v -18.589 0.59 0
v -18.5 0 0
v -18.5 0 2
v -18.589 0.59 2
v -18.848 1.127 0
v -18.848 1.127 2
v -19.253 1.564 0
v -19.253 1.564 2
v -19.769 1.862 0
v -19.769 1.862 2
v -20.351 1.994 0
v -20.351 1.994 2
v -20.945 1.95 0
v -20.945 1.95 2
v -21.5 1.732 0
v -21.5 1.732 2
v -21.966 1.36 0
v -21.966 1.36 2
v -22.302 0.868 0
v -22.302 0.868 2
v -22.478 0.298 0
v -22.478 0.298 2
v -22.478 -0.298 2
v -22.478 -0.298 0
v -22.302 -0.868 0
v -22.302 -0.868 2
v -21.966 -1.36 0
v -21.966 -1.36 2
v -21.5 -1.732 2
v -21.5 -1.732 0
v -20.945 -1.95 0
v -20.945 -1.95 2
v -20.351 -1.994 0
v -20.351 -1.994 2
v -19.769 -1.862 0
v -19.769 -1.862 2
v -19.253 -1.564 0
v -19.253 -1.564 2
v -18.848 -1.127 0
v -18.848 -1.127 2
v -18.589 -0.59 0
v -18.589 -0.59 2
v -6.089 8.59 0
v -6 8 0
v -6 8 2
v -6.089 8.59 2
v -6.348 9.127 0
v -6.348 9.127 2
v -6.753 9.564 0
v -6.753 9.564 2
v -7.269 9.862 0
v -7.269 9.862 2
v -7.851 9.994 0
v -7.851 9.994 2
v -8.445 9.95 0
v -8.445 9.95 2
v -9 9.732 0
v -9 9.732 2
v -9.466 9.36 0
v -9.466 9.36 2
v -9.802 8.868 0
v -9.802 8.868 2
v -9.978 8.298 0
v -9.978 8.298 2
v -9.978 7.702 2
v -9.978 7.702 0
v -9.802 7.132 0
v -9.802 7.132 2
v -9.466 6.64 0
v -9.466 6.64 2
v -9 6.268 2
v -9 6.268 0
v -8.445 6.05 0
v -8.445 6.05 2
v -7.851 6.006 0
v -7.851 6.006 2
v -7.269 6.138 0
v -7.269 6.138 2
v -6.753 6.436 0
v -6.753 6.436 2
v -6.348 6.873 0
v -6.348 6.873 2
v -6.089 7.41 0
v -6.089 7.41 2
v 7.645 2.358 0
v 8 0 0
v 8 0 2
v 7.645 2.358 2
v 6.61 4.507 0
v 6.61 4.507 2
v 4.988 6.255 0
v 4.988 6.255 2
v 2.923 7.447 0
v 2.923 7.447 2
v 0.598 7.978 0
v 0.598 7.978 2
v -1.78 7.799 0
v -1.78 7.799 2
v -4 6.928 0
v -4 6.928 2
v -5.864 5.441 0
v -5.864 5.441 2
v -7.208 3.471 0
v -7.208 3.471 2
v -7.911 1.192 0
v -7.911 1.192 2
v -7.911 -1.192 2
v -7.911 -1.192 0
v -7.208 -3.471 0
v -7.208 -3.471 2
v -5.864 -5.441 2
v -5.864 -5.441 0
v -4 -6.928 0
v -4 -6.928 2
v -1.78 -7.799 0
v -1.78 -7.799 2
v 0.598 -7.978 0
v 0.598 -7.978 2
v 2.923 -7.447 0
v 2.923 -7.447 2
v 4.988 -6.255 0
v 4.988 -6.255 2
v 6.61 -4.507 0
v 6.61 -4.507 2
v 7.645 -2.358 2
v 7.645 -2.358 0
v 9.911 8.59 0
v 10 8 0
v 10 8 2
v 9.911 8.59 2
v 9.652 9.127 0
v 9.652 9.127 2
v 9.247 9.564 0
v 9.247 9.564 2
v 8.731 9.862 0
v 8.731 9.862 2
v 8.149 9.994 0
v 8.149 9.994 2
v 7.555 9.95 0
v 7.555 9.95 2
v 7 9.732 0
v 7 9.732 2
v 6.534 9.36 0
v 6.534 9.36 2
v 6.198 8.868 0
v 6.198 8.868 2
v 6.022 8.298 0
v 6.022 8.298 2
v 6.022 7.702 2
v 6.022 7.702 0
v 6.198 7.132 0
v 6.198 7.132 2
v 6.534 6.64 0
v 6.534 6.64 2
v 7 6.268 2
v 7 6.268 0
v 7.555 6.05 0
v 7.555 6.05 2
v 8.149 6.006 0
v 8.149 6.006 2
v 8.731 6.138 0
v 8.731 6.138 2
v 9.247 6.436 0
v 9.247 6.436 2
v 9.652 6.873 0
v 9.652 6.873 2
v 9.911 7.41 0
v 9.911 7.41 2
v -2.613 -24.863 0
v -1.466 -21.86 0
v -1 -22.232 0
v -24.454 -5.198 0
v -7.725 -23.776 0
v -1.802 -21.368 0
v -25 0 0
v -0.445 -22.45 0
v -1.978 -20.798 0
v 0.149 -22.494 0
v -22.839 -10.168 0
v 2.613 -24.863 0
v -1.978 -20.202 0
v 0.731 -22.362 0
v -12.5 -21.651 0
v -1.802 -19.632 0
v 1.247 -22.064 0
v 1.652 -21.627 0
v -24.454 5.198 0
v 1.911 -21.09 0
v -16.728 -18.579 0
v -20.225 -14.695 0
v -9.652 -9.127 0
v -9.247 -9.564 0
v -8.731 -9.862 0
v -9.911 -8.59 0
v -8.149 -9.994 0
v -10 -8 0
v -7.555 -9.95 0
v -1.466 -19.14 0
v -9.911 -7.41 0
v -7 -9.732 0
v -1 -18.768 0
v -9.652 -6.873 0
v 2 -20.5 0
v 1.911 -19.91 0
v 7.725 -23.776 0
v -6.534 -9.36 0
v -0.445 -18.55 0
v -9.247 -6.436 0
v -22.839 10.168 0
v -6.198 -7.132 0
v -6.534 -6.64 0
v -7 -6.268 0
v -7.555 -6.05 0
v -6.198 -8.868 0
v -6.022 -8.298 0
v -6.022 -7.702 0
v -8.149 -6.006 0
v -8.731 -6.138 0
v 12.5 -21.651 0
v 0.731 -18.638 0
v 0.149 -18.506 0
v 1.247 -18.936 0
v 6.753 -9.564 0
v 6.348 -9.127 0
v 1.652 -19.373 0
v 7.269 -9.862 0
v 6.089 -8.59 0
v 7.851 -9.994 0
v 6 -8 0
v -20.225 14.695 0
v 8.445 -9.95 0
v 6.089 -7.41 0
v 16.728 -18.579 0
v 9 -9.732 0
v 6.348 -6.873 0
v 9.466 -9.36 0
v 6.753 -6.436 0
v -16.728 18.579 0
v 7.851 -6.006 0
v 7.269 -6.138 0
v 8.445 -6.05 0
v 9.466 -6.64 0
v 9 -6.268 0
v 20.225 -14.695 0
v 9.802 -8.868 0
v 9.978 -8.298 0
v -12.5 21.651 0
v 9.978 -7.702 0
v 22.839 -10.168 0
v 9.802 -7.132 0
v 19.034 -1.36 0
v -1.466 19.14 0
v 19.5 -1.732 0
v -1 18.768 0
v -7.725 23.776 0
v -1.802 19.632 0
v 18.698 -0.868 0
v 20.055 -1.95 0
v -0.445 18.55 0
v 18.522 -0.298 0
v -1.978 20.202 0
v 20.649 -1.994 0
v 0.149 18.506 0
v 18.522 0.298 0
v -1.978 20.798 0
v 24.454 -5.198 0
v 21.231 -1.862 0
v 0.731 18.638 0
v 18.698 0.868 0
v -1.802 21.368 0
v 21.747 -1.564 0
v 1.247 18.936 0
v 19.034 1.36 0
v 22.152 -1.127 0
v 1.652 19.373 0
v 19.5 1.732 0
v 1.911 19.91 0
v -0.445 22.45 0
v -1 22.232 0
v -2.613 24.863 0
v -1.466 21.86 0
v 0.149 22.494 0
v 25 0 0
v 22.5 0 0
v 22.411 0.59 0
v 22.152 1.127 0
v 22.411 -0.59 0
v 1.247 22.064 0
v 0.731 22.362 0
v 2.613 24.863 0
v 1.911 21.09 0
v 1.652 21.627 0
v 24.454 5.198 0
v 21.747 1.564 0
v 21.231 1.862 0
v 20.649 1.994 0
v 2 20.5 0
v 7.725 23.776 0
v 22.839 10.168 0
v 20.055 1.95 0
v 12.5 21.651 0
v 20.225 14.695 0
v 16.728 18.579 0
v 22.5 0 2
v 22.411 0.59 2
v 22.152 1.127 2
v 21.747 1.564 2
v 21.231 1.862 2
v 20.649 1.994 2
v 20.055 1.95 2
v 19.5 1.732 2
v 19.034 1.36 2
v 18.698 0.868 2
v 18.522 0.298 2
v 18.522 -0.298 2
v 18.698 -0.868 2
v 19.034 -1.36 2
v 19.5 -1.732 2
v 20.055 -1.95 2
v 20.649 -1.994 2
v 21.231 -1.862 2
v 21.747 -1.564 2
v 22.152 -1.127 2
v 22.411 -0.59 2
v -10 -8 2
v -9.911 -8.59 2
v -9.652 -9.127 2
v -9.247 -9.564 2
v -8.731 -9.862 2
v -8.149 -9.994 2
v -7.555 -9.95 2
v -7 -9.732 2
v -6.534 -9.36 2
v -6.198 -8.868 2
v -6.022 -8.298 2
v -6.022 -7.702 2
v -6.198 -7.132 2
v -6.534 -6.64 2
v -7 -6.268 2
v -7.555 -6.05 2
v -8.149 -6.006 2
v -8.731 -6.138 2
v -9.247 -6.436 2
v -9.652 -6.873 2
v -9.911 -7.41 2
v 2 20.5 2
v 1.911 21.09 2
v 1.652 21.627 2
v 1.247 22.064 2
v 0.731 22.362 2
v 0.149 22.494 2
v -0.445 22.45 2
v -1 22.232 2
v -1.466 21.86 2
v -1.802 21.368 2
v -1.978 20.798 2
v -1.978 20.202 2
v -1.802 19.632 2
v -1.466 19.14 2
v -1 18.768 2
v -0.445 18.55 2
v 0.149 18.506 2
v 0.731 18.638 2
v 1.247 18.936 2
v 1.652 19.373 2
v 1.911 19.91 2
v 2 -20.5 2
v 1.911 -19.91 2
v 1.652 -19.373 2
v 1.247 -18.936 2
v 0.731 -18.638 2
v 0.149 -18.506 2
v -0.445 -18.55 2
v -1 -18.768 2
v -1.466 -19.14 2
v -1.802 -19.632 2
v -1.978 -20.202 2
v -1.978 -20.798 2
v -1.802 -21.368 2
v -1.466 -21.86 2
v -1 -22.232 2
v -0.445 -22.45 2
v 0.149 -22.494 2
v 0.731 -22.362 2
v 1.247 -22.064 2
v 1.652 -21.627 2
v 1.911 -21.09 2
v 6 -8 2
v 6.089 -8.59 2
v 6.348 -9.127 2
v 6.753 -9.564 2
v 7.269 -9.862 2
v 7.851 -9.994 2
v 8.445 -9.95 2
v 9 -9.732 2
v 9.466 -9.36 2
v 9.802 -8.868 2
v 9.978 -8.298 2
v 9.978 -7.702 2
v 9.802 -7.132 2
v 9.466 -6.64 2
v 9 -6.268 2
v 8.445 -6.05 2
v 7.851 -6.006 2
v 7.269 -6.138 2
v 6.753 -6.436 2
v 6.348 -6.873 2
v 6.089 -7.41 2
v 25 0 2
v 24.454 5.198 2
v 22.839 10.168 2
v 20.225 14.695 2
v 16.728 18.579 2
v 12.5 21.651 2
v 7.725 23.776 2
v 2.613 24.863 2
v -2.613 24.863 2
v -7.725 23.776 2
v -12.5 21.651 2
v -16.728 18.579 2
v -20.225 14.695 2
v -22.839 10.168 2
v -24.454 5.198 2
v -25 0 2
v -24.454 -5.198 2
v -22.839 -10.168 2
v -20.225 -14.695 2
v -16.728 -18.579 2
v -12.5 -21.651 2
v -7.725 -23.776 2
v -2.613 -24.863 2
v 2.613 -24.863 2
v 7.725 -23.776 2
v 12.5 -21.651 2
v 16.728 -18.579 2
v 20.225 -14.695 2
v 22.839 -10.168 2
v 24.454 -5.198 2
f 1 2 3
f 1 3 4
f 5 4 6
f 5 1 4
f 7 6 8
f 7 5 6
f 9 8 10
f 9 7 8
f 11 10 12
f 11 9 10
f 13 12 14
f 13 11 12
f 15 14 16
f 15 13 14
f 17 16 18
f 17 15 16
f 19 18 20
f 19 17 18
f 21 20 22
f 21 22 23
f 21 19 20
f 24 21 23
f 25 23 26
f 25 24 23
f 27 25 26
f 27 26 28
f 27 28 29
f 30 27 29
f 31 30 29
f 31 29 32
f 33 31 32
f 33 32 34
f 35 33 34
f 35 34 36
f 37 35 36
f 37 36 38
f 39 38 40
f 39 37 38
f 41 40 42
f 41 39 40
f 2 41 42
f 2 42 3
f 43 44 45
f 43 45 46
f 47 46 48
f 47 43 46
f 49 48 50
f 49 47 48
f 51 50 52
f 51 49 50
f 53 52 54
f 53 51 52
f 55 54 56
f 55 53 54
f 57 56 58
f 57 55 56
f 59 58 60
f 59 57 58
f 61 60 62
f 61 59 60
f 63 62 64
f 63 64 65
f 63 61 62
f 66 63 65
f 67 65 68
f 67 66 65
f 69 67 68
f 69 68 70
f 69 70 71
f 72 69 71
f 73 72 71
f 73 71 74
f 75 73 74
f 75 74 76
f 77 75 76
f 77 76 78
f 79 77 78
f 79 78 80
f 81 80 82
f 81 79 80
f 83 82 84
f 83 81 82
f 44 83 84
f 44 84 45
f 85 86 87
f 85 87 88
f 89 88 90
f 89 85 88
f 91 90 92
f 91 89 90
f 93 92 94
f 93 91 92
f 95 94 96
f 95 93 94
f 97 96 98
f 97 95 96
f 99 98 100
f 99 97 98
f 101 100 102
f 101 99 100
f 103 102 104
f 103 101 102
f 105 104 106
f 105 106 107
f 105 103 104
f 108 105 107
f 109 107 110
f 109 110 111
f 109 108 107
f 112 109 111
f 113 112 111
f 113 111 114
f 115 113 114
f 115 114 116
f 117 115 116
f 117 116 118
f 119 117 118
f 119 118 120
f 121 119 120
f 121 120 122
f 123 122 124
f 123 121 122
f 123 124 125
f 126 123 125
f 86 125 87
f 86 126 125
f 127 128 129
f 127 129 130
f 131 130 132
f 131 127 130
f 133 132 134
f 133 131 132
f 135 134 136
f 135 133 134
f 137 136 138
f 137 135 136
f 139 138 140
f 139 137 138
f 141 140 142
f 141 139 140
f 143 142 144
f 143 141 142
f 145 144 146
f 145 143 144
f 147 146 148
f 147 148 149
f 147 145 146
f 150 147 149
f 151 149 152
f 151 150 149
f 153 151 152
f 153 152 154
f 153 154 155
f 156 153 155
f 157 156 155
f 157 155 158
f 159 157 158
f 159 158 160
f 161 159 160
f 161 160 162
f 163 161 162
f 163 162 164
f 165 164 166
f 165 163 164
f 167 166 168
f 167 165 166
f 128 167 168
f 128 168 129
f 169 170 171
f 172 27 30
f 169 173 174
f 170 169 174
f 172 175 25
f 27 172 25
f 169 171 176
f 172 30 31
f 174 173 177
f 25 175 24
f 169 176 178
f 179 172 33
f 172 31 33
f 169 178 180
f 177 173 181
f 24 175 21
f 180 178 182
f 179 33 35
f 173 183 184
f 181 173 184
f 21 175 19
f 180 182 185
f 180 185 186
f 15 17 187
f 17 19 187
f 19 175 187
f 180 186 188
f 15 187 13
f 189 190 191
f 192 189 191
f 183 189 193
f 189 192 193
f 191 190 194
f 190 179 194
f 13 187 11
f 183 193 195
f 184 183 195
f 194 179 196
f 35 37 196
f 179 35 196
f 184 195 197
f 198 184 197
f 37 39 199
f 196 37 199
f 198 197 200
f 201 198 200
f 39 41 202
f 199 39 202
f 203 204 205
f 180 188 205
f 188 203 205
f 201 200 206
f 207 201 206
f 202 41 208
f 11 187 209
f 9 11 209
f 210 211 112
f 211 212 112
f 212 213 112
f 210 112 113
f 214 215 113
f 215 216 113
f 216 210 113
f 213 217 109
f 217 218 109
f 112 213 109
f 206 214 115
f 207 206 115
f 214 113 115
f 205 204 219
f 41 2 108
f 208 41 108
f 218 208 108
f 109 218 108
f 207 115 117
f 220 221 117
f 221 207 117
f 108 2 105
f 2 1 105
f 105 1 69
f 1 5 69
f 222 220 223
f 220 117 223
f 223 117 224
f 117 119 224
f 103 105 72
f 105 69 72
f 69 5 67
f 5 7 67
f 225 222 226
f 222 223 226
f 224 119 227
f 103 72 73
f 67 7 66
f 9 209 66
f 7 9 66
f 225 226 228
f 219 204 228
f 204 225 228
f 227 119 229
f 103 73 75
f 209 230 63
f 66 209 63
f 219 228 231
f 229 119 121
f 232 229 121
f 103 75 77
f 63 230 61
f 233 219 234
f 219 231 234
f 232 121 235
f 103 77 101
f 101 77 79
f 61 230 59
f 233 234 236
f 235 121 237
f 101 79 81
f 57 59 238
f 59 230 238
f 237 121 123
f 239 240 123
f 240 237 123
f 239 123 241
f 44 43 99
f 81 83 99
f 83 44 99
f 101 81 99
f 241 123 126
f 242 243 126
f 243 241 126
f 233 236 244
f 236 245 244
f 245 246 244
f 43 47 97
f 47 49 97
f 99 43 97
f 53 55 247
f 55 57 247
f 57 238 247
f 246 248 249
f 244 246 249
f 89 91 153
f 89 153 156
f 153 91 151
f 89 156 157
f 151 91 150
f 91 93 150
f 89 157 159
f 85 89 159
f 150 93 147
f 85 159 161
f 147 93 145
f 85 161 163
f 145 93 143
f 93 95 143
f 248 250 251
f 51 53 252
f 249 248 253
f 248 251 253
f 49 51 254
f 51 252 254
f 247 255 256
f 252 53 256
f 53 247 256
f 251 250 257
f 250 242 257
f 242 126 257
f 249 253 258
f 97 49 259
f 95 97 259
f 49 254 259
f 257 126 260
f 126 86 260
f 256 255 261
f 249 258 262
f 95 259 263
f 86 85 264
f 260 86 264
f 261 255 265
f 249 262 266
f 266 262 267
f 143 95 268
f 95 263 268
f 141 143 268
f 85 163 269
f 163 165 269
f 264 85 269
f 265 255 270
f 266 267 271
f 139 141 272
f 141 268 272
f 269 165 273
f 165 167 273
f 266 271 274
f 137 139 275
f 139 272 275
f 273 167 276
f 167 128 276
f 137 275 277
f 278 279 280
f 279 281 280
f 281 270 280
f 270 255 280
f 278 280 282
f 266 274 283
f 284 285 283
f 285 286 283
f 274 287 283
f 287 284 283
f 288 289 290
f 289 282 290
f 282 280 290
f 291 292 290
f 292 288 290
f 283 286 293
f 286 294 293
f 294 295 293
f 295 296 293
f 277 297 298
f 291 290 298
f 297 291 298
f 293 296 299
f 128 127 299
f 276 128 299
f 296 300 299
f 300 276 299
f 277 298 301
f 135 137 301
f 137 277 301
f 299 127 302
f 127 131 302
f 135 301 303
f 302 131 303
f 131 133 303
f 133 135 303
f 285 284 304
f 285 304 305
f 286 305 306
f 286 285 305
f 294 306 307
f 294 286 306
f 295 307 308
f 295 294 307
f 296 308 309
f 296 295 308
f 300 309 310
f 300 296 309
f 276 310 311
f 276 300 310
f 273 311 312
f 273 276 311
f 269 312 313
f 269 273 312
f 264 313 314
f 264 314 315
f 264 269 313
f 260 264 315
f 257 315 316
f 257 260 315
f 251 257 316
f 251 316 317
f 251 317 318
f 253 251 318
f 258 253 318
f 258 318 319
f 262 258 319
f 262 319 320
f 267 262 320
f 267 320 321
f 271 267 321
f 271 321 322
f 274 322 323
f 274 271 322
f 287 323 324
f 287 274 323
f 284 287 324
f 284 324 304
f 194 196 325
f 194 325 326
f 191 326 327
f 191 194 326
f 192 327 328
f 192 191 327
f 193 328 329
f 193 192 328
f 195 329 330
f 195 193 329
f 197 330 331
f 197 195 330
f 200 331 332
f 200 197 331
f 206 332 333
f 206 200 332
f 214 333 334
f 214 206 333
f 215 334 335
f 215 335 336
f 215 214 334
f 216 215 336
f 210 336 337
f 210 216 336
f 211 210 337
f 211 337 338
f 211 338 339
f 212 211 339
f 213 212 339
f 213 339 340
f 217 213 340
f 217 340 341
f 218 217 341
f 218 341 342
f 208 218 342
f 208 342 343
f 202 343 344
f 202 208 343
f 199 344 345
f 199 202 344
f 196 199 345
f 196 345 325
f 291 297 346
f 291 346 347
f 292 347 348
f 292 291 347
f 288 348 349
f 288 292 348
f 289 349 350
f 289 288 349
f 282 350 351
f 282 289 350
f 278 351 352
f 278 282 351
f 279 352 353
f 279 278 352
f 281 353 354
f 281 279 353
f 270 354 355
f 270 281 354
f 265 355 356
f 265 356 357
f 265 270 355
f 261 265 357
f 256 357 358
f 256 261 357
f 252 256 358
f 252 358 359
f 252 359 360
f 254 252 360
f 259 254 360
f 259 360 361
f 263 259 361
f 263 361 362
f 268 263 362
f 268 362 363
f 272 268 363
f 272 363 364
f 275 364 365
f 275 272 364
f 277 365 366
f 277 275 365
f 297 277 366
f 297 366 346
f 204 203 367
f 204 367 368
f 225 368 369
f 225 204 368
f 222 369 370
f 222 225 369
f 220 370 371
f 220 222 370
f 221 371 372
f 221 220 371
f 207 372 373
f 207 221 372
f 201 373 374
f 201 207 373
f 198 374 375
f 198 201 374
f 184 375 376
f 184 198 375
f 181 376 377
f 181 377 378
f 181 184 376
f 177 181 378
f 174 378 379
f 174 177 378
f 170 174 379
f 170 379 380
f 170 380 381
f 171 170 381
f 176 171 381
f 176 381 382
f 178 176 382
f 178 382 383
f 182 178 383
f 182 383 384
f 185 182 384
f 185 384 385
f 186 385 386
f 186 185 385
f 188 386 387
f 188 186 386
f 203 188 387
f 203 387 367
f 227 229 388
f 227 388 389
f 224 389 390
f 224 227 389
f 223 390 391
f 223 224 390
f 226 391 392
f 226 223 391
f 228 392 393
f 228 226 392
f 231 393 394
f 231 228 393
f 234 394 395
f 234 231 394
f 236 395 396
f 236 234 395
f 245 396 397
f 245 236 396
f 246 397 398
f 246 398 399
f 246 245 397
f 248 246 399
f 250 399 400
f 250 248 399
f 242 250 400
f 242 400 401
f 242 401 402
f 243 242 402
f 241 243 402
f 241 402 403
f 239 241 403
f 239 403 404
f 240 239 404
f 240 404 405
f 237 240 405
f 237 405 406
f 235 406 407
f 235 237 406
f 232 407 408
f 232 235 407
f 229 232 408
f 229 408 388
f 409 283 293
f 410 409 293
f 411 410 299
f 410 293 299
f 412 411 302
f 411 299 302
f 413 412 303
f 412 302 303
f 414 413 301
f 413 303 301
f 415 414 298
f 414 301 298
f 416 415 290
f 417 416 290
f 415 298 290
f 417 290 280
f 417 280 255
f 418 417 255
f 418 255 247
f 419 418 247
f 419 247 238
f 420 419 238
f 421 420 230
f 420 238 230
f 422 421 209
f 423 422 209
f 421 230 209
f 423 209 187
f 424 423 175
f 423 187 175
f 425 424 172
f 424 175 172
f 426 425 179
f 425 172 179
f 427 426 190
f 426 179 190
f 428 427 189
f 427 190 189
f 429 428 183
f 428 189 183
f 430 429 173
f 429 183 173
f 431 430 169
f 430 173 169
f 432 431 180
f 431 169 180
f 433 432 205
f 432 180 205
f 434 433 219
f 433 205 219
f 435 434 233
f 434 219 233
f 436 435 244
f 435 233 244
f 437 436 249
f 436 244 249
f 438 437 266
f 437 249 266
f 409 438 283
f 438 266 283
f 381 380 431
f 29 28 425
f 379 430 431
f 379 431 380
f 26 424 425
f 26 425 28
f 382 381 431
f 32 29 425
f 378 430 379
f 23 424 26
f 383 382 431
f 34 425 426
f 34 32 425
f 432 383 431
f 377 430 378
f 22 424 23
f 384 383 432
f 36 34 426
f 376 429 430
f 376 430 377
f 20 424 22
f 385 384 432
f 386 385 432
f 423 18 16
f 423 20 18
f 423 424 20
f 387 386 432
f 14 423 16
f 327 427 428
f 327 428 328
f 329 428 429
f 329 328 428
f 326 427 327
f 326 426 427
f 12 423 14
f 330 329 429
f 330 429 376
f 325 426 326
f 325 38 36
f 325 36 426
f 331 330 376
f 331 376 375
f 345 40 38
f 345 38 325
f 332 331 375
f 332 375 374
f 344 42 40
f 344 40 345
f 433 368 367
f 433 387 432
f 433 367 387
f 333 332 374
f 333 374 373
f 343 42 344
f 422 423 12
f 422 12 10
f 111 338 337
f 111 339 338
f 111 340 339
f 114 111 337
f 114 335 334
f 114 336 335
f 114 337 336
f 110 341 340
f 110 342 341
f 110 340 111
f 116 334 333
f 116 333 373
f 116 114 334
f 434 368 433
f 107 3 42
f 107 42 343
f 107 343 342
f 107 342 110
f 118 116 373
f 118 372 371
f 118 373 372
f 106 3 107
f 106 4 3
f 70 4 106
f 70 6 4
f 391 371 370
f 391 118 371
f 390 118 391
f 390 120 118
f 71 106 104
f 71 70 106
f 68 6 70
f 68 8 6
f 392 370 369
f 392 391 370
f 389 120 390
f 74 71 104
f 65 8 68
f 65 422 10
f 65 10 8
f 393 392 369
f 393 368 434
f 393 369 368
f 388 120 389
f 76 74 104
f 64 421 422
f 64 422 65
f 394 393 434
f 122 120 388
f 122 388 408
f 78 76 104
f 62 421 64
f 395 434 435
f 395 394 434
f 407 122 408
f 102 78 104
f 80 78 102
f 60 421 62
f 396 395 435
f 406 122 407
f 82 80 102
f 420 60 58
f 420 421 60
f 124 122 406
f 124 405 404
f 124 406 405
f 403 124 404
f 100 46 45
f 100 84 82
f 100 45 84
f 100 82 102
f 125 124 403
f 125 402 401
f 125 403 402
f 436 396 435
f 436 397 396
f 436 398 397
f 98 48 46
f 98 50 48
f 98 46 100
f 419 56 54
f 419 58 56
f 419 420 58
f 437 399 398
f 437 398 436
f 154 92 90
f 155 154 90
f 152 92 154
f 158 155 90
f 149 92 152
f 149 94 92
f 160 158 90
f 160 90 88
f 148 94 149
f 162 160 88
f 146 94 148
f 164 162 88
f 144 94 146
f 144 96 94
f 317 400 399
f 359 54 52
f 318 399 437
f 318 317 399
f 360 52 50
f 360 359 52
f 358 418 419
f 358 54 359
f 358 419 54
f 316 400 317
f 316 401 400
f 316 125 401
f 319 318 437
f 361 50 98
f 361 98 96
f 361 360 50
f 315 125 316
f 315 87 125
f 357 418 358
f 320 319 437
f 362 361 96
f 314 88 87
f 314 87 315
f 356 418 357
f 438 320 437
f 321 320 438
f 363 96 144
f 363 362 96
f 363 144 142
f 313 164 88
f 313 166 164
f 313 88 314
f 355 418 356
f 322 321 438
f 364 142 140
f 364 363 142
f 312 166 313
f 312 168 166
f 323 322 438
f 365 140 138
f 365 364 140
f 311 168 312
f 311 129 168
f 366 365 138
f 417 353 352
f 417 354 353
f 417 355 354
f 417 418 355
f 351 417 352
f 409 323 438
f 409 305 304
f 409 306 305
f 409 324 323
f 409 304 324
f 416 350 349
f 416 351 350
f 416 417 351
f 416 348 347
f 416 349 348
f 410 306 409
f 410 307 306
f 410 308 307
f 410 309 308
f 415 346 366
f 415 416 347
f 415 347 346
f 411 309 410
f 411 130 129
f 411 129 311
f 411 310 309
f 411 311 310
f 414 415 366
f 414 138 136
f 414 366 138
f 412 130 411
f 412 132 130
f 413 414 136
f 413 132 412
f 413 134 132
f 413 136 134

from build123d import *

# Parameters (mm, degrees)
SKETCH1_R           = 25
SKETCH1_R_2         = 8
SKETCH1_R_3         = 2
BOSS_EXTRUDE1_DEPTH = 2


with BuildPart() as part:
    # Sketch1 → Boss-Extrude1 (new body)
    with BuildSketch(Plane.XY):
        Circle(SKETCH1_R)
        Circle(SKETCH1_R_2, mode=Mode.SUBTRACT)
        with Locations((-8, 8)):
            Circle(SKETCH1_R_3, mode=Mode.SUBTRACT)
        with Locations((8, 8)):
            Circle(SKETCH1_R_3, mode=Mode.SUBTRACT)
        with Locations(Location((8, -8, 0), (0, 0, 180))):
            Circle(SKETCH1_R_3, mode=Mode.SUBTRACT)
        with Locations(Location((-8, -8, 0), (0, 0, 180))):
            Circle(SKETCH1_R_3, mode=Mode.SUBTRACT)
        with Locations((0, 20.5)):
            Circle(SKETCH1_R_3, mode=Mode.SUBTRACT)
        with Locations((20.5, 0)):
            Circle(SKETCH1_R_3, mode=Mode.SUBTRACT)
        with Locations((0, -20.5)):
            Circle(SKETCH1_R_3, mode=Mode.SUBTRACT)
        with Locations((-20.5, 0)):
            Circle(SKETCH1_R_3, mode=Mode.SUBTRACT)
    extrude(amount=BOSS_EXTRUDE1_DEPTH)


solid = part.part
